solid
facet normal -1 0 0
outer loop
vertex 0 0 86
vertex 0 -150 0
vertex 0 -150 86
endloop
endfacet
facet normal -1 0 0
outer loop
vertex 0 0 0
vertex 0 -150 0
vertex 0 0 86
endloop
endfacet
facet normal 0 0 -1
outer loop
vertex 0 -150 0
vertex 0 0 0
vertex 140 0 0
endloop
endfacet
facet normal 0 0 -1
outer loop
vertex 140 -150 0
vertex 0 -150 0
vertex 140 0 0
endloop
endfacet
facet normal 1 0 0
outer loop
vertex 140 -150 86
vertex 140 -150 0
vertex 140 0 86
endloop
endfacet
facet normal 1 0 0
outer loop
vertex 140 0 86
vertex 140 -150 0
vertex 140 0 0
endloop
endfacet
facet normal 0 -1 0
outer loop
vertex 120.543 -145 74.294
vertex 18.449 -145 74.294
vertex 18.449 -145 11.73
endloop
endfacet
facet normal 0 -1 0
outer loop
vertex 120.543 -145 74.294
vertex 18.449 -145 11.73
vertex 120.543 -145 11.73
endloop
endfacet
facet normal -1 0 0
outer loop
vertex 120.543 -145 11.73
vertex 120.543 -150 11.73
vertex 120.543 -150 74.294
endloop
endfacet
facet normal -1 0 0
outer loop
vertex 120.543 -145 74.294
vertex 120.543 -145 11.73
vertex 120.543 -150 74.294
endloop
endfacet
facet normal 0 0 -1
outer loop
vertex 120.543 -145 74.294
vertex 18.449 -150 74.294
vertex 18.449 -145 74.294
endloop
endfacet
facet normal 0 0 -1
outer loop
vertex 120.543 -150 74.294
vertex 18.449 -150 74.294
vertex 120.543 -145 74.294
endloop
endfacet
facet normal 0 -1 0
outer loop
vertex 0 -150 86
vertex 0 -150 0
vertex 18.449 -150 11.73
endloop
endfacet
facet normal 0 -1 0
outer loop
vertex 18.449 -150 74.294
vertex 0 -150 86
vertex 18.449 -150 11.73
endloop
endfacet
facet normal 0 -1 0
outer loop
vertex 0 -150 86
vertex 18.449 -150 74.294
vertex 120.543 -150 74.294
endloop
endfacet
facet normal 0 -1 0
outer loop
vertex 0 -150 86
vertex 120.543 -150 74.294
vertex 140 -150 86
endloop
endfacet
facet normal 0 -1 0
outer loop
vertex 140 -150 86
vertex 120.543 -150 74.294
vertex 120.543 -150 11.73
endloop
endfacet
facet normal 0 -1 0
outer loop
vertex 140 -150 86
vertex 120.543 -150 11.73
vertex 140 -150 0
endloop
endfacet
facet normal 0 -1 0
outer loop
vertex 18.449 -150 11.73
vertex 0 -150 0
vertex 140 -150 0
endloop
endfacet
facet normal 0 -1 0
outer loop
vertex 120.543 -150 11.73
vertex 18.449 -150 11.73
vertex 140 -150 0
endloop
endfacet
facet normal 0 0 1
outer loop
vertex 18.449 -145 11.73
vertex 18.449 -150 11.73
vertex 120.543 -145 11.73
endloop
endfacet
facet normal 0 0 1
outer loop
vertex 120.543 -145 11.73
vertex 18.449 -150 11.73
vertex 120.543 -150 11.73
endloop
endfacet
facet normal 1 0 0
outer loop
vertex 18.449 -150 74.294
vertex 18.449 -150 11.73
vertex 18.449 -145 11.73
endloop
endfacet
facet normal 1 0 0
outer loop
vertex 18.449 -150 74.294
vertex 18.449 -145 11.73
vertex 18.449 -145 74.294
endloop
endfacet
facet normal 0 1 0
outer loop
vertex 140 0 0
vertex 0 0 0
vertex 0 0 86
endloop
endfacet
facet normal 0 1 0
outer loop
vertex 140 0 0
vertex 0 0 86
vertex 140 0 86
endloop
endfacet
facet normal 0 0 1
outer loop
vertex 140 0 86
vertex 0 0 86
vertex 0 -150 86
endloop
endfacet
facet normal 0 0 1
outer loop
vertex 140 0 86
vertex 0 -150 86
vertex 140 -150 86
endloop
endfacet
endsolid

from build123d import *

# Parameters (mm, degrees)
SKETCH_W     = 140
SKETCH_H     = 150
PAD_DEPTH    = 86
SKETCH001_W  = 102.094734
SKETCH001_H  = 62.564154
POCKET_DEPTH = 5


with BuildPart() as part:
    # Sketch → Pad (new body)
    with BuildSketch(Plane.XY):
        with Locations((70, -75)):
            Rectangle(SKETCH_W, SKETCH_H)
    extrude(amount=PAD_DEPTH)

    # Sketch001 (on Face3 of Pad) → Pocket (cut)
    with BuildSketch(Plane.XZ.offset(150)):
        with Locations((69.496113, 43.012418)):
            Rectangle(SKETCH001_W, SKETCH001_H)
    extrude(amount=-POCKET_DEPTH, mode=Mode.SUBTRACT)


solid = part.part
